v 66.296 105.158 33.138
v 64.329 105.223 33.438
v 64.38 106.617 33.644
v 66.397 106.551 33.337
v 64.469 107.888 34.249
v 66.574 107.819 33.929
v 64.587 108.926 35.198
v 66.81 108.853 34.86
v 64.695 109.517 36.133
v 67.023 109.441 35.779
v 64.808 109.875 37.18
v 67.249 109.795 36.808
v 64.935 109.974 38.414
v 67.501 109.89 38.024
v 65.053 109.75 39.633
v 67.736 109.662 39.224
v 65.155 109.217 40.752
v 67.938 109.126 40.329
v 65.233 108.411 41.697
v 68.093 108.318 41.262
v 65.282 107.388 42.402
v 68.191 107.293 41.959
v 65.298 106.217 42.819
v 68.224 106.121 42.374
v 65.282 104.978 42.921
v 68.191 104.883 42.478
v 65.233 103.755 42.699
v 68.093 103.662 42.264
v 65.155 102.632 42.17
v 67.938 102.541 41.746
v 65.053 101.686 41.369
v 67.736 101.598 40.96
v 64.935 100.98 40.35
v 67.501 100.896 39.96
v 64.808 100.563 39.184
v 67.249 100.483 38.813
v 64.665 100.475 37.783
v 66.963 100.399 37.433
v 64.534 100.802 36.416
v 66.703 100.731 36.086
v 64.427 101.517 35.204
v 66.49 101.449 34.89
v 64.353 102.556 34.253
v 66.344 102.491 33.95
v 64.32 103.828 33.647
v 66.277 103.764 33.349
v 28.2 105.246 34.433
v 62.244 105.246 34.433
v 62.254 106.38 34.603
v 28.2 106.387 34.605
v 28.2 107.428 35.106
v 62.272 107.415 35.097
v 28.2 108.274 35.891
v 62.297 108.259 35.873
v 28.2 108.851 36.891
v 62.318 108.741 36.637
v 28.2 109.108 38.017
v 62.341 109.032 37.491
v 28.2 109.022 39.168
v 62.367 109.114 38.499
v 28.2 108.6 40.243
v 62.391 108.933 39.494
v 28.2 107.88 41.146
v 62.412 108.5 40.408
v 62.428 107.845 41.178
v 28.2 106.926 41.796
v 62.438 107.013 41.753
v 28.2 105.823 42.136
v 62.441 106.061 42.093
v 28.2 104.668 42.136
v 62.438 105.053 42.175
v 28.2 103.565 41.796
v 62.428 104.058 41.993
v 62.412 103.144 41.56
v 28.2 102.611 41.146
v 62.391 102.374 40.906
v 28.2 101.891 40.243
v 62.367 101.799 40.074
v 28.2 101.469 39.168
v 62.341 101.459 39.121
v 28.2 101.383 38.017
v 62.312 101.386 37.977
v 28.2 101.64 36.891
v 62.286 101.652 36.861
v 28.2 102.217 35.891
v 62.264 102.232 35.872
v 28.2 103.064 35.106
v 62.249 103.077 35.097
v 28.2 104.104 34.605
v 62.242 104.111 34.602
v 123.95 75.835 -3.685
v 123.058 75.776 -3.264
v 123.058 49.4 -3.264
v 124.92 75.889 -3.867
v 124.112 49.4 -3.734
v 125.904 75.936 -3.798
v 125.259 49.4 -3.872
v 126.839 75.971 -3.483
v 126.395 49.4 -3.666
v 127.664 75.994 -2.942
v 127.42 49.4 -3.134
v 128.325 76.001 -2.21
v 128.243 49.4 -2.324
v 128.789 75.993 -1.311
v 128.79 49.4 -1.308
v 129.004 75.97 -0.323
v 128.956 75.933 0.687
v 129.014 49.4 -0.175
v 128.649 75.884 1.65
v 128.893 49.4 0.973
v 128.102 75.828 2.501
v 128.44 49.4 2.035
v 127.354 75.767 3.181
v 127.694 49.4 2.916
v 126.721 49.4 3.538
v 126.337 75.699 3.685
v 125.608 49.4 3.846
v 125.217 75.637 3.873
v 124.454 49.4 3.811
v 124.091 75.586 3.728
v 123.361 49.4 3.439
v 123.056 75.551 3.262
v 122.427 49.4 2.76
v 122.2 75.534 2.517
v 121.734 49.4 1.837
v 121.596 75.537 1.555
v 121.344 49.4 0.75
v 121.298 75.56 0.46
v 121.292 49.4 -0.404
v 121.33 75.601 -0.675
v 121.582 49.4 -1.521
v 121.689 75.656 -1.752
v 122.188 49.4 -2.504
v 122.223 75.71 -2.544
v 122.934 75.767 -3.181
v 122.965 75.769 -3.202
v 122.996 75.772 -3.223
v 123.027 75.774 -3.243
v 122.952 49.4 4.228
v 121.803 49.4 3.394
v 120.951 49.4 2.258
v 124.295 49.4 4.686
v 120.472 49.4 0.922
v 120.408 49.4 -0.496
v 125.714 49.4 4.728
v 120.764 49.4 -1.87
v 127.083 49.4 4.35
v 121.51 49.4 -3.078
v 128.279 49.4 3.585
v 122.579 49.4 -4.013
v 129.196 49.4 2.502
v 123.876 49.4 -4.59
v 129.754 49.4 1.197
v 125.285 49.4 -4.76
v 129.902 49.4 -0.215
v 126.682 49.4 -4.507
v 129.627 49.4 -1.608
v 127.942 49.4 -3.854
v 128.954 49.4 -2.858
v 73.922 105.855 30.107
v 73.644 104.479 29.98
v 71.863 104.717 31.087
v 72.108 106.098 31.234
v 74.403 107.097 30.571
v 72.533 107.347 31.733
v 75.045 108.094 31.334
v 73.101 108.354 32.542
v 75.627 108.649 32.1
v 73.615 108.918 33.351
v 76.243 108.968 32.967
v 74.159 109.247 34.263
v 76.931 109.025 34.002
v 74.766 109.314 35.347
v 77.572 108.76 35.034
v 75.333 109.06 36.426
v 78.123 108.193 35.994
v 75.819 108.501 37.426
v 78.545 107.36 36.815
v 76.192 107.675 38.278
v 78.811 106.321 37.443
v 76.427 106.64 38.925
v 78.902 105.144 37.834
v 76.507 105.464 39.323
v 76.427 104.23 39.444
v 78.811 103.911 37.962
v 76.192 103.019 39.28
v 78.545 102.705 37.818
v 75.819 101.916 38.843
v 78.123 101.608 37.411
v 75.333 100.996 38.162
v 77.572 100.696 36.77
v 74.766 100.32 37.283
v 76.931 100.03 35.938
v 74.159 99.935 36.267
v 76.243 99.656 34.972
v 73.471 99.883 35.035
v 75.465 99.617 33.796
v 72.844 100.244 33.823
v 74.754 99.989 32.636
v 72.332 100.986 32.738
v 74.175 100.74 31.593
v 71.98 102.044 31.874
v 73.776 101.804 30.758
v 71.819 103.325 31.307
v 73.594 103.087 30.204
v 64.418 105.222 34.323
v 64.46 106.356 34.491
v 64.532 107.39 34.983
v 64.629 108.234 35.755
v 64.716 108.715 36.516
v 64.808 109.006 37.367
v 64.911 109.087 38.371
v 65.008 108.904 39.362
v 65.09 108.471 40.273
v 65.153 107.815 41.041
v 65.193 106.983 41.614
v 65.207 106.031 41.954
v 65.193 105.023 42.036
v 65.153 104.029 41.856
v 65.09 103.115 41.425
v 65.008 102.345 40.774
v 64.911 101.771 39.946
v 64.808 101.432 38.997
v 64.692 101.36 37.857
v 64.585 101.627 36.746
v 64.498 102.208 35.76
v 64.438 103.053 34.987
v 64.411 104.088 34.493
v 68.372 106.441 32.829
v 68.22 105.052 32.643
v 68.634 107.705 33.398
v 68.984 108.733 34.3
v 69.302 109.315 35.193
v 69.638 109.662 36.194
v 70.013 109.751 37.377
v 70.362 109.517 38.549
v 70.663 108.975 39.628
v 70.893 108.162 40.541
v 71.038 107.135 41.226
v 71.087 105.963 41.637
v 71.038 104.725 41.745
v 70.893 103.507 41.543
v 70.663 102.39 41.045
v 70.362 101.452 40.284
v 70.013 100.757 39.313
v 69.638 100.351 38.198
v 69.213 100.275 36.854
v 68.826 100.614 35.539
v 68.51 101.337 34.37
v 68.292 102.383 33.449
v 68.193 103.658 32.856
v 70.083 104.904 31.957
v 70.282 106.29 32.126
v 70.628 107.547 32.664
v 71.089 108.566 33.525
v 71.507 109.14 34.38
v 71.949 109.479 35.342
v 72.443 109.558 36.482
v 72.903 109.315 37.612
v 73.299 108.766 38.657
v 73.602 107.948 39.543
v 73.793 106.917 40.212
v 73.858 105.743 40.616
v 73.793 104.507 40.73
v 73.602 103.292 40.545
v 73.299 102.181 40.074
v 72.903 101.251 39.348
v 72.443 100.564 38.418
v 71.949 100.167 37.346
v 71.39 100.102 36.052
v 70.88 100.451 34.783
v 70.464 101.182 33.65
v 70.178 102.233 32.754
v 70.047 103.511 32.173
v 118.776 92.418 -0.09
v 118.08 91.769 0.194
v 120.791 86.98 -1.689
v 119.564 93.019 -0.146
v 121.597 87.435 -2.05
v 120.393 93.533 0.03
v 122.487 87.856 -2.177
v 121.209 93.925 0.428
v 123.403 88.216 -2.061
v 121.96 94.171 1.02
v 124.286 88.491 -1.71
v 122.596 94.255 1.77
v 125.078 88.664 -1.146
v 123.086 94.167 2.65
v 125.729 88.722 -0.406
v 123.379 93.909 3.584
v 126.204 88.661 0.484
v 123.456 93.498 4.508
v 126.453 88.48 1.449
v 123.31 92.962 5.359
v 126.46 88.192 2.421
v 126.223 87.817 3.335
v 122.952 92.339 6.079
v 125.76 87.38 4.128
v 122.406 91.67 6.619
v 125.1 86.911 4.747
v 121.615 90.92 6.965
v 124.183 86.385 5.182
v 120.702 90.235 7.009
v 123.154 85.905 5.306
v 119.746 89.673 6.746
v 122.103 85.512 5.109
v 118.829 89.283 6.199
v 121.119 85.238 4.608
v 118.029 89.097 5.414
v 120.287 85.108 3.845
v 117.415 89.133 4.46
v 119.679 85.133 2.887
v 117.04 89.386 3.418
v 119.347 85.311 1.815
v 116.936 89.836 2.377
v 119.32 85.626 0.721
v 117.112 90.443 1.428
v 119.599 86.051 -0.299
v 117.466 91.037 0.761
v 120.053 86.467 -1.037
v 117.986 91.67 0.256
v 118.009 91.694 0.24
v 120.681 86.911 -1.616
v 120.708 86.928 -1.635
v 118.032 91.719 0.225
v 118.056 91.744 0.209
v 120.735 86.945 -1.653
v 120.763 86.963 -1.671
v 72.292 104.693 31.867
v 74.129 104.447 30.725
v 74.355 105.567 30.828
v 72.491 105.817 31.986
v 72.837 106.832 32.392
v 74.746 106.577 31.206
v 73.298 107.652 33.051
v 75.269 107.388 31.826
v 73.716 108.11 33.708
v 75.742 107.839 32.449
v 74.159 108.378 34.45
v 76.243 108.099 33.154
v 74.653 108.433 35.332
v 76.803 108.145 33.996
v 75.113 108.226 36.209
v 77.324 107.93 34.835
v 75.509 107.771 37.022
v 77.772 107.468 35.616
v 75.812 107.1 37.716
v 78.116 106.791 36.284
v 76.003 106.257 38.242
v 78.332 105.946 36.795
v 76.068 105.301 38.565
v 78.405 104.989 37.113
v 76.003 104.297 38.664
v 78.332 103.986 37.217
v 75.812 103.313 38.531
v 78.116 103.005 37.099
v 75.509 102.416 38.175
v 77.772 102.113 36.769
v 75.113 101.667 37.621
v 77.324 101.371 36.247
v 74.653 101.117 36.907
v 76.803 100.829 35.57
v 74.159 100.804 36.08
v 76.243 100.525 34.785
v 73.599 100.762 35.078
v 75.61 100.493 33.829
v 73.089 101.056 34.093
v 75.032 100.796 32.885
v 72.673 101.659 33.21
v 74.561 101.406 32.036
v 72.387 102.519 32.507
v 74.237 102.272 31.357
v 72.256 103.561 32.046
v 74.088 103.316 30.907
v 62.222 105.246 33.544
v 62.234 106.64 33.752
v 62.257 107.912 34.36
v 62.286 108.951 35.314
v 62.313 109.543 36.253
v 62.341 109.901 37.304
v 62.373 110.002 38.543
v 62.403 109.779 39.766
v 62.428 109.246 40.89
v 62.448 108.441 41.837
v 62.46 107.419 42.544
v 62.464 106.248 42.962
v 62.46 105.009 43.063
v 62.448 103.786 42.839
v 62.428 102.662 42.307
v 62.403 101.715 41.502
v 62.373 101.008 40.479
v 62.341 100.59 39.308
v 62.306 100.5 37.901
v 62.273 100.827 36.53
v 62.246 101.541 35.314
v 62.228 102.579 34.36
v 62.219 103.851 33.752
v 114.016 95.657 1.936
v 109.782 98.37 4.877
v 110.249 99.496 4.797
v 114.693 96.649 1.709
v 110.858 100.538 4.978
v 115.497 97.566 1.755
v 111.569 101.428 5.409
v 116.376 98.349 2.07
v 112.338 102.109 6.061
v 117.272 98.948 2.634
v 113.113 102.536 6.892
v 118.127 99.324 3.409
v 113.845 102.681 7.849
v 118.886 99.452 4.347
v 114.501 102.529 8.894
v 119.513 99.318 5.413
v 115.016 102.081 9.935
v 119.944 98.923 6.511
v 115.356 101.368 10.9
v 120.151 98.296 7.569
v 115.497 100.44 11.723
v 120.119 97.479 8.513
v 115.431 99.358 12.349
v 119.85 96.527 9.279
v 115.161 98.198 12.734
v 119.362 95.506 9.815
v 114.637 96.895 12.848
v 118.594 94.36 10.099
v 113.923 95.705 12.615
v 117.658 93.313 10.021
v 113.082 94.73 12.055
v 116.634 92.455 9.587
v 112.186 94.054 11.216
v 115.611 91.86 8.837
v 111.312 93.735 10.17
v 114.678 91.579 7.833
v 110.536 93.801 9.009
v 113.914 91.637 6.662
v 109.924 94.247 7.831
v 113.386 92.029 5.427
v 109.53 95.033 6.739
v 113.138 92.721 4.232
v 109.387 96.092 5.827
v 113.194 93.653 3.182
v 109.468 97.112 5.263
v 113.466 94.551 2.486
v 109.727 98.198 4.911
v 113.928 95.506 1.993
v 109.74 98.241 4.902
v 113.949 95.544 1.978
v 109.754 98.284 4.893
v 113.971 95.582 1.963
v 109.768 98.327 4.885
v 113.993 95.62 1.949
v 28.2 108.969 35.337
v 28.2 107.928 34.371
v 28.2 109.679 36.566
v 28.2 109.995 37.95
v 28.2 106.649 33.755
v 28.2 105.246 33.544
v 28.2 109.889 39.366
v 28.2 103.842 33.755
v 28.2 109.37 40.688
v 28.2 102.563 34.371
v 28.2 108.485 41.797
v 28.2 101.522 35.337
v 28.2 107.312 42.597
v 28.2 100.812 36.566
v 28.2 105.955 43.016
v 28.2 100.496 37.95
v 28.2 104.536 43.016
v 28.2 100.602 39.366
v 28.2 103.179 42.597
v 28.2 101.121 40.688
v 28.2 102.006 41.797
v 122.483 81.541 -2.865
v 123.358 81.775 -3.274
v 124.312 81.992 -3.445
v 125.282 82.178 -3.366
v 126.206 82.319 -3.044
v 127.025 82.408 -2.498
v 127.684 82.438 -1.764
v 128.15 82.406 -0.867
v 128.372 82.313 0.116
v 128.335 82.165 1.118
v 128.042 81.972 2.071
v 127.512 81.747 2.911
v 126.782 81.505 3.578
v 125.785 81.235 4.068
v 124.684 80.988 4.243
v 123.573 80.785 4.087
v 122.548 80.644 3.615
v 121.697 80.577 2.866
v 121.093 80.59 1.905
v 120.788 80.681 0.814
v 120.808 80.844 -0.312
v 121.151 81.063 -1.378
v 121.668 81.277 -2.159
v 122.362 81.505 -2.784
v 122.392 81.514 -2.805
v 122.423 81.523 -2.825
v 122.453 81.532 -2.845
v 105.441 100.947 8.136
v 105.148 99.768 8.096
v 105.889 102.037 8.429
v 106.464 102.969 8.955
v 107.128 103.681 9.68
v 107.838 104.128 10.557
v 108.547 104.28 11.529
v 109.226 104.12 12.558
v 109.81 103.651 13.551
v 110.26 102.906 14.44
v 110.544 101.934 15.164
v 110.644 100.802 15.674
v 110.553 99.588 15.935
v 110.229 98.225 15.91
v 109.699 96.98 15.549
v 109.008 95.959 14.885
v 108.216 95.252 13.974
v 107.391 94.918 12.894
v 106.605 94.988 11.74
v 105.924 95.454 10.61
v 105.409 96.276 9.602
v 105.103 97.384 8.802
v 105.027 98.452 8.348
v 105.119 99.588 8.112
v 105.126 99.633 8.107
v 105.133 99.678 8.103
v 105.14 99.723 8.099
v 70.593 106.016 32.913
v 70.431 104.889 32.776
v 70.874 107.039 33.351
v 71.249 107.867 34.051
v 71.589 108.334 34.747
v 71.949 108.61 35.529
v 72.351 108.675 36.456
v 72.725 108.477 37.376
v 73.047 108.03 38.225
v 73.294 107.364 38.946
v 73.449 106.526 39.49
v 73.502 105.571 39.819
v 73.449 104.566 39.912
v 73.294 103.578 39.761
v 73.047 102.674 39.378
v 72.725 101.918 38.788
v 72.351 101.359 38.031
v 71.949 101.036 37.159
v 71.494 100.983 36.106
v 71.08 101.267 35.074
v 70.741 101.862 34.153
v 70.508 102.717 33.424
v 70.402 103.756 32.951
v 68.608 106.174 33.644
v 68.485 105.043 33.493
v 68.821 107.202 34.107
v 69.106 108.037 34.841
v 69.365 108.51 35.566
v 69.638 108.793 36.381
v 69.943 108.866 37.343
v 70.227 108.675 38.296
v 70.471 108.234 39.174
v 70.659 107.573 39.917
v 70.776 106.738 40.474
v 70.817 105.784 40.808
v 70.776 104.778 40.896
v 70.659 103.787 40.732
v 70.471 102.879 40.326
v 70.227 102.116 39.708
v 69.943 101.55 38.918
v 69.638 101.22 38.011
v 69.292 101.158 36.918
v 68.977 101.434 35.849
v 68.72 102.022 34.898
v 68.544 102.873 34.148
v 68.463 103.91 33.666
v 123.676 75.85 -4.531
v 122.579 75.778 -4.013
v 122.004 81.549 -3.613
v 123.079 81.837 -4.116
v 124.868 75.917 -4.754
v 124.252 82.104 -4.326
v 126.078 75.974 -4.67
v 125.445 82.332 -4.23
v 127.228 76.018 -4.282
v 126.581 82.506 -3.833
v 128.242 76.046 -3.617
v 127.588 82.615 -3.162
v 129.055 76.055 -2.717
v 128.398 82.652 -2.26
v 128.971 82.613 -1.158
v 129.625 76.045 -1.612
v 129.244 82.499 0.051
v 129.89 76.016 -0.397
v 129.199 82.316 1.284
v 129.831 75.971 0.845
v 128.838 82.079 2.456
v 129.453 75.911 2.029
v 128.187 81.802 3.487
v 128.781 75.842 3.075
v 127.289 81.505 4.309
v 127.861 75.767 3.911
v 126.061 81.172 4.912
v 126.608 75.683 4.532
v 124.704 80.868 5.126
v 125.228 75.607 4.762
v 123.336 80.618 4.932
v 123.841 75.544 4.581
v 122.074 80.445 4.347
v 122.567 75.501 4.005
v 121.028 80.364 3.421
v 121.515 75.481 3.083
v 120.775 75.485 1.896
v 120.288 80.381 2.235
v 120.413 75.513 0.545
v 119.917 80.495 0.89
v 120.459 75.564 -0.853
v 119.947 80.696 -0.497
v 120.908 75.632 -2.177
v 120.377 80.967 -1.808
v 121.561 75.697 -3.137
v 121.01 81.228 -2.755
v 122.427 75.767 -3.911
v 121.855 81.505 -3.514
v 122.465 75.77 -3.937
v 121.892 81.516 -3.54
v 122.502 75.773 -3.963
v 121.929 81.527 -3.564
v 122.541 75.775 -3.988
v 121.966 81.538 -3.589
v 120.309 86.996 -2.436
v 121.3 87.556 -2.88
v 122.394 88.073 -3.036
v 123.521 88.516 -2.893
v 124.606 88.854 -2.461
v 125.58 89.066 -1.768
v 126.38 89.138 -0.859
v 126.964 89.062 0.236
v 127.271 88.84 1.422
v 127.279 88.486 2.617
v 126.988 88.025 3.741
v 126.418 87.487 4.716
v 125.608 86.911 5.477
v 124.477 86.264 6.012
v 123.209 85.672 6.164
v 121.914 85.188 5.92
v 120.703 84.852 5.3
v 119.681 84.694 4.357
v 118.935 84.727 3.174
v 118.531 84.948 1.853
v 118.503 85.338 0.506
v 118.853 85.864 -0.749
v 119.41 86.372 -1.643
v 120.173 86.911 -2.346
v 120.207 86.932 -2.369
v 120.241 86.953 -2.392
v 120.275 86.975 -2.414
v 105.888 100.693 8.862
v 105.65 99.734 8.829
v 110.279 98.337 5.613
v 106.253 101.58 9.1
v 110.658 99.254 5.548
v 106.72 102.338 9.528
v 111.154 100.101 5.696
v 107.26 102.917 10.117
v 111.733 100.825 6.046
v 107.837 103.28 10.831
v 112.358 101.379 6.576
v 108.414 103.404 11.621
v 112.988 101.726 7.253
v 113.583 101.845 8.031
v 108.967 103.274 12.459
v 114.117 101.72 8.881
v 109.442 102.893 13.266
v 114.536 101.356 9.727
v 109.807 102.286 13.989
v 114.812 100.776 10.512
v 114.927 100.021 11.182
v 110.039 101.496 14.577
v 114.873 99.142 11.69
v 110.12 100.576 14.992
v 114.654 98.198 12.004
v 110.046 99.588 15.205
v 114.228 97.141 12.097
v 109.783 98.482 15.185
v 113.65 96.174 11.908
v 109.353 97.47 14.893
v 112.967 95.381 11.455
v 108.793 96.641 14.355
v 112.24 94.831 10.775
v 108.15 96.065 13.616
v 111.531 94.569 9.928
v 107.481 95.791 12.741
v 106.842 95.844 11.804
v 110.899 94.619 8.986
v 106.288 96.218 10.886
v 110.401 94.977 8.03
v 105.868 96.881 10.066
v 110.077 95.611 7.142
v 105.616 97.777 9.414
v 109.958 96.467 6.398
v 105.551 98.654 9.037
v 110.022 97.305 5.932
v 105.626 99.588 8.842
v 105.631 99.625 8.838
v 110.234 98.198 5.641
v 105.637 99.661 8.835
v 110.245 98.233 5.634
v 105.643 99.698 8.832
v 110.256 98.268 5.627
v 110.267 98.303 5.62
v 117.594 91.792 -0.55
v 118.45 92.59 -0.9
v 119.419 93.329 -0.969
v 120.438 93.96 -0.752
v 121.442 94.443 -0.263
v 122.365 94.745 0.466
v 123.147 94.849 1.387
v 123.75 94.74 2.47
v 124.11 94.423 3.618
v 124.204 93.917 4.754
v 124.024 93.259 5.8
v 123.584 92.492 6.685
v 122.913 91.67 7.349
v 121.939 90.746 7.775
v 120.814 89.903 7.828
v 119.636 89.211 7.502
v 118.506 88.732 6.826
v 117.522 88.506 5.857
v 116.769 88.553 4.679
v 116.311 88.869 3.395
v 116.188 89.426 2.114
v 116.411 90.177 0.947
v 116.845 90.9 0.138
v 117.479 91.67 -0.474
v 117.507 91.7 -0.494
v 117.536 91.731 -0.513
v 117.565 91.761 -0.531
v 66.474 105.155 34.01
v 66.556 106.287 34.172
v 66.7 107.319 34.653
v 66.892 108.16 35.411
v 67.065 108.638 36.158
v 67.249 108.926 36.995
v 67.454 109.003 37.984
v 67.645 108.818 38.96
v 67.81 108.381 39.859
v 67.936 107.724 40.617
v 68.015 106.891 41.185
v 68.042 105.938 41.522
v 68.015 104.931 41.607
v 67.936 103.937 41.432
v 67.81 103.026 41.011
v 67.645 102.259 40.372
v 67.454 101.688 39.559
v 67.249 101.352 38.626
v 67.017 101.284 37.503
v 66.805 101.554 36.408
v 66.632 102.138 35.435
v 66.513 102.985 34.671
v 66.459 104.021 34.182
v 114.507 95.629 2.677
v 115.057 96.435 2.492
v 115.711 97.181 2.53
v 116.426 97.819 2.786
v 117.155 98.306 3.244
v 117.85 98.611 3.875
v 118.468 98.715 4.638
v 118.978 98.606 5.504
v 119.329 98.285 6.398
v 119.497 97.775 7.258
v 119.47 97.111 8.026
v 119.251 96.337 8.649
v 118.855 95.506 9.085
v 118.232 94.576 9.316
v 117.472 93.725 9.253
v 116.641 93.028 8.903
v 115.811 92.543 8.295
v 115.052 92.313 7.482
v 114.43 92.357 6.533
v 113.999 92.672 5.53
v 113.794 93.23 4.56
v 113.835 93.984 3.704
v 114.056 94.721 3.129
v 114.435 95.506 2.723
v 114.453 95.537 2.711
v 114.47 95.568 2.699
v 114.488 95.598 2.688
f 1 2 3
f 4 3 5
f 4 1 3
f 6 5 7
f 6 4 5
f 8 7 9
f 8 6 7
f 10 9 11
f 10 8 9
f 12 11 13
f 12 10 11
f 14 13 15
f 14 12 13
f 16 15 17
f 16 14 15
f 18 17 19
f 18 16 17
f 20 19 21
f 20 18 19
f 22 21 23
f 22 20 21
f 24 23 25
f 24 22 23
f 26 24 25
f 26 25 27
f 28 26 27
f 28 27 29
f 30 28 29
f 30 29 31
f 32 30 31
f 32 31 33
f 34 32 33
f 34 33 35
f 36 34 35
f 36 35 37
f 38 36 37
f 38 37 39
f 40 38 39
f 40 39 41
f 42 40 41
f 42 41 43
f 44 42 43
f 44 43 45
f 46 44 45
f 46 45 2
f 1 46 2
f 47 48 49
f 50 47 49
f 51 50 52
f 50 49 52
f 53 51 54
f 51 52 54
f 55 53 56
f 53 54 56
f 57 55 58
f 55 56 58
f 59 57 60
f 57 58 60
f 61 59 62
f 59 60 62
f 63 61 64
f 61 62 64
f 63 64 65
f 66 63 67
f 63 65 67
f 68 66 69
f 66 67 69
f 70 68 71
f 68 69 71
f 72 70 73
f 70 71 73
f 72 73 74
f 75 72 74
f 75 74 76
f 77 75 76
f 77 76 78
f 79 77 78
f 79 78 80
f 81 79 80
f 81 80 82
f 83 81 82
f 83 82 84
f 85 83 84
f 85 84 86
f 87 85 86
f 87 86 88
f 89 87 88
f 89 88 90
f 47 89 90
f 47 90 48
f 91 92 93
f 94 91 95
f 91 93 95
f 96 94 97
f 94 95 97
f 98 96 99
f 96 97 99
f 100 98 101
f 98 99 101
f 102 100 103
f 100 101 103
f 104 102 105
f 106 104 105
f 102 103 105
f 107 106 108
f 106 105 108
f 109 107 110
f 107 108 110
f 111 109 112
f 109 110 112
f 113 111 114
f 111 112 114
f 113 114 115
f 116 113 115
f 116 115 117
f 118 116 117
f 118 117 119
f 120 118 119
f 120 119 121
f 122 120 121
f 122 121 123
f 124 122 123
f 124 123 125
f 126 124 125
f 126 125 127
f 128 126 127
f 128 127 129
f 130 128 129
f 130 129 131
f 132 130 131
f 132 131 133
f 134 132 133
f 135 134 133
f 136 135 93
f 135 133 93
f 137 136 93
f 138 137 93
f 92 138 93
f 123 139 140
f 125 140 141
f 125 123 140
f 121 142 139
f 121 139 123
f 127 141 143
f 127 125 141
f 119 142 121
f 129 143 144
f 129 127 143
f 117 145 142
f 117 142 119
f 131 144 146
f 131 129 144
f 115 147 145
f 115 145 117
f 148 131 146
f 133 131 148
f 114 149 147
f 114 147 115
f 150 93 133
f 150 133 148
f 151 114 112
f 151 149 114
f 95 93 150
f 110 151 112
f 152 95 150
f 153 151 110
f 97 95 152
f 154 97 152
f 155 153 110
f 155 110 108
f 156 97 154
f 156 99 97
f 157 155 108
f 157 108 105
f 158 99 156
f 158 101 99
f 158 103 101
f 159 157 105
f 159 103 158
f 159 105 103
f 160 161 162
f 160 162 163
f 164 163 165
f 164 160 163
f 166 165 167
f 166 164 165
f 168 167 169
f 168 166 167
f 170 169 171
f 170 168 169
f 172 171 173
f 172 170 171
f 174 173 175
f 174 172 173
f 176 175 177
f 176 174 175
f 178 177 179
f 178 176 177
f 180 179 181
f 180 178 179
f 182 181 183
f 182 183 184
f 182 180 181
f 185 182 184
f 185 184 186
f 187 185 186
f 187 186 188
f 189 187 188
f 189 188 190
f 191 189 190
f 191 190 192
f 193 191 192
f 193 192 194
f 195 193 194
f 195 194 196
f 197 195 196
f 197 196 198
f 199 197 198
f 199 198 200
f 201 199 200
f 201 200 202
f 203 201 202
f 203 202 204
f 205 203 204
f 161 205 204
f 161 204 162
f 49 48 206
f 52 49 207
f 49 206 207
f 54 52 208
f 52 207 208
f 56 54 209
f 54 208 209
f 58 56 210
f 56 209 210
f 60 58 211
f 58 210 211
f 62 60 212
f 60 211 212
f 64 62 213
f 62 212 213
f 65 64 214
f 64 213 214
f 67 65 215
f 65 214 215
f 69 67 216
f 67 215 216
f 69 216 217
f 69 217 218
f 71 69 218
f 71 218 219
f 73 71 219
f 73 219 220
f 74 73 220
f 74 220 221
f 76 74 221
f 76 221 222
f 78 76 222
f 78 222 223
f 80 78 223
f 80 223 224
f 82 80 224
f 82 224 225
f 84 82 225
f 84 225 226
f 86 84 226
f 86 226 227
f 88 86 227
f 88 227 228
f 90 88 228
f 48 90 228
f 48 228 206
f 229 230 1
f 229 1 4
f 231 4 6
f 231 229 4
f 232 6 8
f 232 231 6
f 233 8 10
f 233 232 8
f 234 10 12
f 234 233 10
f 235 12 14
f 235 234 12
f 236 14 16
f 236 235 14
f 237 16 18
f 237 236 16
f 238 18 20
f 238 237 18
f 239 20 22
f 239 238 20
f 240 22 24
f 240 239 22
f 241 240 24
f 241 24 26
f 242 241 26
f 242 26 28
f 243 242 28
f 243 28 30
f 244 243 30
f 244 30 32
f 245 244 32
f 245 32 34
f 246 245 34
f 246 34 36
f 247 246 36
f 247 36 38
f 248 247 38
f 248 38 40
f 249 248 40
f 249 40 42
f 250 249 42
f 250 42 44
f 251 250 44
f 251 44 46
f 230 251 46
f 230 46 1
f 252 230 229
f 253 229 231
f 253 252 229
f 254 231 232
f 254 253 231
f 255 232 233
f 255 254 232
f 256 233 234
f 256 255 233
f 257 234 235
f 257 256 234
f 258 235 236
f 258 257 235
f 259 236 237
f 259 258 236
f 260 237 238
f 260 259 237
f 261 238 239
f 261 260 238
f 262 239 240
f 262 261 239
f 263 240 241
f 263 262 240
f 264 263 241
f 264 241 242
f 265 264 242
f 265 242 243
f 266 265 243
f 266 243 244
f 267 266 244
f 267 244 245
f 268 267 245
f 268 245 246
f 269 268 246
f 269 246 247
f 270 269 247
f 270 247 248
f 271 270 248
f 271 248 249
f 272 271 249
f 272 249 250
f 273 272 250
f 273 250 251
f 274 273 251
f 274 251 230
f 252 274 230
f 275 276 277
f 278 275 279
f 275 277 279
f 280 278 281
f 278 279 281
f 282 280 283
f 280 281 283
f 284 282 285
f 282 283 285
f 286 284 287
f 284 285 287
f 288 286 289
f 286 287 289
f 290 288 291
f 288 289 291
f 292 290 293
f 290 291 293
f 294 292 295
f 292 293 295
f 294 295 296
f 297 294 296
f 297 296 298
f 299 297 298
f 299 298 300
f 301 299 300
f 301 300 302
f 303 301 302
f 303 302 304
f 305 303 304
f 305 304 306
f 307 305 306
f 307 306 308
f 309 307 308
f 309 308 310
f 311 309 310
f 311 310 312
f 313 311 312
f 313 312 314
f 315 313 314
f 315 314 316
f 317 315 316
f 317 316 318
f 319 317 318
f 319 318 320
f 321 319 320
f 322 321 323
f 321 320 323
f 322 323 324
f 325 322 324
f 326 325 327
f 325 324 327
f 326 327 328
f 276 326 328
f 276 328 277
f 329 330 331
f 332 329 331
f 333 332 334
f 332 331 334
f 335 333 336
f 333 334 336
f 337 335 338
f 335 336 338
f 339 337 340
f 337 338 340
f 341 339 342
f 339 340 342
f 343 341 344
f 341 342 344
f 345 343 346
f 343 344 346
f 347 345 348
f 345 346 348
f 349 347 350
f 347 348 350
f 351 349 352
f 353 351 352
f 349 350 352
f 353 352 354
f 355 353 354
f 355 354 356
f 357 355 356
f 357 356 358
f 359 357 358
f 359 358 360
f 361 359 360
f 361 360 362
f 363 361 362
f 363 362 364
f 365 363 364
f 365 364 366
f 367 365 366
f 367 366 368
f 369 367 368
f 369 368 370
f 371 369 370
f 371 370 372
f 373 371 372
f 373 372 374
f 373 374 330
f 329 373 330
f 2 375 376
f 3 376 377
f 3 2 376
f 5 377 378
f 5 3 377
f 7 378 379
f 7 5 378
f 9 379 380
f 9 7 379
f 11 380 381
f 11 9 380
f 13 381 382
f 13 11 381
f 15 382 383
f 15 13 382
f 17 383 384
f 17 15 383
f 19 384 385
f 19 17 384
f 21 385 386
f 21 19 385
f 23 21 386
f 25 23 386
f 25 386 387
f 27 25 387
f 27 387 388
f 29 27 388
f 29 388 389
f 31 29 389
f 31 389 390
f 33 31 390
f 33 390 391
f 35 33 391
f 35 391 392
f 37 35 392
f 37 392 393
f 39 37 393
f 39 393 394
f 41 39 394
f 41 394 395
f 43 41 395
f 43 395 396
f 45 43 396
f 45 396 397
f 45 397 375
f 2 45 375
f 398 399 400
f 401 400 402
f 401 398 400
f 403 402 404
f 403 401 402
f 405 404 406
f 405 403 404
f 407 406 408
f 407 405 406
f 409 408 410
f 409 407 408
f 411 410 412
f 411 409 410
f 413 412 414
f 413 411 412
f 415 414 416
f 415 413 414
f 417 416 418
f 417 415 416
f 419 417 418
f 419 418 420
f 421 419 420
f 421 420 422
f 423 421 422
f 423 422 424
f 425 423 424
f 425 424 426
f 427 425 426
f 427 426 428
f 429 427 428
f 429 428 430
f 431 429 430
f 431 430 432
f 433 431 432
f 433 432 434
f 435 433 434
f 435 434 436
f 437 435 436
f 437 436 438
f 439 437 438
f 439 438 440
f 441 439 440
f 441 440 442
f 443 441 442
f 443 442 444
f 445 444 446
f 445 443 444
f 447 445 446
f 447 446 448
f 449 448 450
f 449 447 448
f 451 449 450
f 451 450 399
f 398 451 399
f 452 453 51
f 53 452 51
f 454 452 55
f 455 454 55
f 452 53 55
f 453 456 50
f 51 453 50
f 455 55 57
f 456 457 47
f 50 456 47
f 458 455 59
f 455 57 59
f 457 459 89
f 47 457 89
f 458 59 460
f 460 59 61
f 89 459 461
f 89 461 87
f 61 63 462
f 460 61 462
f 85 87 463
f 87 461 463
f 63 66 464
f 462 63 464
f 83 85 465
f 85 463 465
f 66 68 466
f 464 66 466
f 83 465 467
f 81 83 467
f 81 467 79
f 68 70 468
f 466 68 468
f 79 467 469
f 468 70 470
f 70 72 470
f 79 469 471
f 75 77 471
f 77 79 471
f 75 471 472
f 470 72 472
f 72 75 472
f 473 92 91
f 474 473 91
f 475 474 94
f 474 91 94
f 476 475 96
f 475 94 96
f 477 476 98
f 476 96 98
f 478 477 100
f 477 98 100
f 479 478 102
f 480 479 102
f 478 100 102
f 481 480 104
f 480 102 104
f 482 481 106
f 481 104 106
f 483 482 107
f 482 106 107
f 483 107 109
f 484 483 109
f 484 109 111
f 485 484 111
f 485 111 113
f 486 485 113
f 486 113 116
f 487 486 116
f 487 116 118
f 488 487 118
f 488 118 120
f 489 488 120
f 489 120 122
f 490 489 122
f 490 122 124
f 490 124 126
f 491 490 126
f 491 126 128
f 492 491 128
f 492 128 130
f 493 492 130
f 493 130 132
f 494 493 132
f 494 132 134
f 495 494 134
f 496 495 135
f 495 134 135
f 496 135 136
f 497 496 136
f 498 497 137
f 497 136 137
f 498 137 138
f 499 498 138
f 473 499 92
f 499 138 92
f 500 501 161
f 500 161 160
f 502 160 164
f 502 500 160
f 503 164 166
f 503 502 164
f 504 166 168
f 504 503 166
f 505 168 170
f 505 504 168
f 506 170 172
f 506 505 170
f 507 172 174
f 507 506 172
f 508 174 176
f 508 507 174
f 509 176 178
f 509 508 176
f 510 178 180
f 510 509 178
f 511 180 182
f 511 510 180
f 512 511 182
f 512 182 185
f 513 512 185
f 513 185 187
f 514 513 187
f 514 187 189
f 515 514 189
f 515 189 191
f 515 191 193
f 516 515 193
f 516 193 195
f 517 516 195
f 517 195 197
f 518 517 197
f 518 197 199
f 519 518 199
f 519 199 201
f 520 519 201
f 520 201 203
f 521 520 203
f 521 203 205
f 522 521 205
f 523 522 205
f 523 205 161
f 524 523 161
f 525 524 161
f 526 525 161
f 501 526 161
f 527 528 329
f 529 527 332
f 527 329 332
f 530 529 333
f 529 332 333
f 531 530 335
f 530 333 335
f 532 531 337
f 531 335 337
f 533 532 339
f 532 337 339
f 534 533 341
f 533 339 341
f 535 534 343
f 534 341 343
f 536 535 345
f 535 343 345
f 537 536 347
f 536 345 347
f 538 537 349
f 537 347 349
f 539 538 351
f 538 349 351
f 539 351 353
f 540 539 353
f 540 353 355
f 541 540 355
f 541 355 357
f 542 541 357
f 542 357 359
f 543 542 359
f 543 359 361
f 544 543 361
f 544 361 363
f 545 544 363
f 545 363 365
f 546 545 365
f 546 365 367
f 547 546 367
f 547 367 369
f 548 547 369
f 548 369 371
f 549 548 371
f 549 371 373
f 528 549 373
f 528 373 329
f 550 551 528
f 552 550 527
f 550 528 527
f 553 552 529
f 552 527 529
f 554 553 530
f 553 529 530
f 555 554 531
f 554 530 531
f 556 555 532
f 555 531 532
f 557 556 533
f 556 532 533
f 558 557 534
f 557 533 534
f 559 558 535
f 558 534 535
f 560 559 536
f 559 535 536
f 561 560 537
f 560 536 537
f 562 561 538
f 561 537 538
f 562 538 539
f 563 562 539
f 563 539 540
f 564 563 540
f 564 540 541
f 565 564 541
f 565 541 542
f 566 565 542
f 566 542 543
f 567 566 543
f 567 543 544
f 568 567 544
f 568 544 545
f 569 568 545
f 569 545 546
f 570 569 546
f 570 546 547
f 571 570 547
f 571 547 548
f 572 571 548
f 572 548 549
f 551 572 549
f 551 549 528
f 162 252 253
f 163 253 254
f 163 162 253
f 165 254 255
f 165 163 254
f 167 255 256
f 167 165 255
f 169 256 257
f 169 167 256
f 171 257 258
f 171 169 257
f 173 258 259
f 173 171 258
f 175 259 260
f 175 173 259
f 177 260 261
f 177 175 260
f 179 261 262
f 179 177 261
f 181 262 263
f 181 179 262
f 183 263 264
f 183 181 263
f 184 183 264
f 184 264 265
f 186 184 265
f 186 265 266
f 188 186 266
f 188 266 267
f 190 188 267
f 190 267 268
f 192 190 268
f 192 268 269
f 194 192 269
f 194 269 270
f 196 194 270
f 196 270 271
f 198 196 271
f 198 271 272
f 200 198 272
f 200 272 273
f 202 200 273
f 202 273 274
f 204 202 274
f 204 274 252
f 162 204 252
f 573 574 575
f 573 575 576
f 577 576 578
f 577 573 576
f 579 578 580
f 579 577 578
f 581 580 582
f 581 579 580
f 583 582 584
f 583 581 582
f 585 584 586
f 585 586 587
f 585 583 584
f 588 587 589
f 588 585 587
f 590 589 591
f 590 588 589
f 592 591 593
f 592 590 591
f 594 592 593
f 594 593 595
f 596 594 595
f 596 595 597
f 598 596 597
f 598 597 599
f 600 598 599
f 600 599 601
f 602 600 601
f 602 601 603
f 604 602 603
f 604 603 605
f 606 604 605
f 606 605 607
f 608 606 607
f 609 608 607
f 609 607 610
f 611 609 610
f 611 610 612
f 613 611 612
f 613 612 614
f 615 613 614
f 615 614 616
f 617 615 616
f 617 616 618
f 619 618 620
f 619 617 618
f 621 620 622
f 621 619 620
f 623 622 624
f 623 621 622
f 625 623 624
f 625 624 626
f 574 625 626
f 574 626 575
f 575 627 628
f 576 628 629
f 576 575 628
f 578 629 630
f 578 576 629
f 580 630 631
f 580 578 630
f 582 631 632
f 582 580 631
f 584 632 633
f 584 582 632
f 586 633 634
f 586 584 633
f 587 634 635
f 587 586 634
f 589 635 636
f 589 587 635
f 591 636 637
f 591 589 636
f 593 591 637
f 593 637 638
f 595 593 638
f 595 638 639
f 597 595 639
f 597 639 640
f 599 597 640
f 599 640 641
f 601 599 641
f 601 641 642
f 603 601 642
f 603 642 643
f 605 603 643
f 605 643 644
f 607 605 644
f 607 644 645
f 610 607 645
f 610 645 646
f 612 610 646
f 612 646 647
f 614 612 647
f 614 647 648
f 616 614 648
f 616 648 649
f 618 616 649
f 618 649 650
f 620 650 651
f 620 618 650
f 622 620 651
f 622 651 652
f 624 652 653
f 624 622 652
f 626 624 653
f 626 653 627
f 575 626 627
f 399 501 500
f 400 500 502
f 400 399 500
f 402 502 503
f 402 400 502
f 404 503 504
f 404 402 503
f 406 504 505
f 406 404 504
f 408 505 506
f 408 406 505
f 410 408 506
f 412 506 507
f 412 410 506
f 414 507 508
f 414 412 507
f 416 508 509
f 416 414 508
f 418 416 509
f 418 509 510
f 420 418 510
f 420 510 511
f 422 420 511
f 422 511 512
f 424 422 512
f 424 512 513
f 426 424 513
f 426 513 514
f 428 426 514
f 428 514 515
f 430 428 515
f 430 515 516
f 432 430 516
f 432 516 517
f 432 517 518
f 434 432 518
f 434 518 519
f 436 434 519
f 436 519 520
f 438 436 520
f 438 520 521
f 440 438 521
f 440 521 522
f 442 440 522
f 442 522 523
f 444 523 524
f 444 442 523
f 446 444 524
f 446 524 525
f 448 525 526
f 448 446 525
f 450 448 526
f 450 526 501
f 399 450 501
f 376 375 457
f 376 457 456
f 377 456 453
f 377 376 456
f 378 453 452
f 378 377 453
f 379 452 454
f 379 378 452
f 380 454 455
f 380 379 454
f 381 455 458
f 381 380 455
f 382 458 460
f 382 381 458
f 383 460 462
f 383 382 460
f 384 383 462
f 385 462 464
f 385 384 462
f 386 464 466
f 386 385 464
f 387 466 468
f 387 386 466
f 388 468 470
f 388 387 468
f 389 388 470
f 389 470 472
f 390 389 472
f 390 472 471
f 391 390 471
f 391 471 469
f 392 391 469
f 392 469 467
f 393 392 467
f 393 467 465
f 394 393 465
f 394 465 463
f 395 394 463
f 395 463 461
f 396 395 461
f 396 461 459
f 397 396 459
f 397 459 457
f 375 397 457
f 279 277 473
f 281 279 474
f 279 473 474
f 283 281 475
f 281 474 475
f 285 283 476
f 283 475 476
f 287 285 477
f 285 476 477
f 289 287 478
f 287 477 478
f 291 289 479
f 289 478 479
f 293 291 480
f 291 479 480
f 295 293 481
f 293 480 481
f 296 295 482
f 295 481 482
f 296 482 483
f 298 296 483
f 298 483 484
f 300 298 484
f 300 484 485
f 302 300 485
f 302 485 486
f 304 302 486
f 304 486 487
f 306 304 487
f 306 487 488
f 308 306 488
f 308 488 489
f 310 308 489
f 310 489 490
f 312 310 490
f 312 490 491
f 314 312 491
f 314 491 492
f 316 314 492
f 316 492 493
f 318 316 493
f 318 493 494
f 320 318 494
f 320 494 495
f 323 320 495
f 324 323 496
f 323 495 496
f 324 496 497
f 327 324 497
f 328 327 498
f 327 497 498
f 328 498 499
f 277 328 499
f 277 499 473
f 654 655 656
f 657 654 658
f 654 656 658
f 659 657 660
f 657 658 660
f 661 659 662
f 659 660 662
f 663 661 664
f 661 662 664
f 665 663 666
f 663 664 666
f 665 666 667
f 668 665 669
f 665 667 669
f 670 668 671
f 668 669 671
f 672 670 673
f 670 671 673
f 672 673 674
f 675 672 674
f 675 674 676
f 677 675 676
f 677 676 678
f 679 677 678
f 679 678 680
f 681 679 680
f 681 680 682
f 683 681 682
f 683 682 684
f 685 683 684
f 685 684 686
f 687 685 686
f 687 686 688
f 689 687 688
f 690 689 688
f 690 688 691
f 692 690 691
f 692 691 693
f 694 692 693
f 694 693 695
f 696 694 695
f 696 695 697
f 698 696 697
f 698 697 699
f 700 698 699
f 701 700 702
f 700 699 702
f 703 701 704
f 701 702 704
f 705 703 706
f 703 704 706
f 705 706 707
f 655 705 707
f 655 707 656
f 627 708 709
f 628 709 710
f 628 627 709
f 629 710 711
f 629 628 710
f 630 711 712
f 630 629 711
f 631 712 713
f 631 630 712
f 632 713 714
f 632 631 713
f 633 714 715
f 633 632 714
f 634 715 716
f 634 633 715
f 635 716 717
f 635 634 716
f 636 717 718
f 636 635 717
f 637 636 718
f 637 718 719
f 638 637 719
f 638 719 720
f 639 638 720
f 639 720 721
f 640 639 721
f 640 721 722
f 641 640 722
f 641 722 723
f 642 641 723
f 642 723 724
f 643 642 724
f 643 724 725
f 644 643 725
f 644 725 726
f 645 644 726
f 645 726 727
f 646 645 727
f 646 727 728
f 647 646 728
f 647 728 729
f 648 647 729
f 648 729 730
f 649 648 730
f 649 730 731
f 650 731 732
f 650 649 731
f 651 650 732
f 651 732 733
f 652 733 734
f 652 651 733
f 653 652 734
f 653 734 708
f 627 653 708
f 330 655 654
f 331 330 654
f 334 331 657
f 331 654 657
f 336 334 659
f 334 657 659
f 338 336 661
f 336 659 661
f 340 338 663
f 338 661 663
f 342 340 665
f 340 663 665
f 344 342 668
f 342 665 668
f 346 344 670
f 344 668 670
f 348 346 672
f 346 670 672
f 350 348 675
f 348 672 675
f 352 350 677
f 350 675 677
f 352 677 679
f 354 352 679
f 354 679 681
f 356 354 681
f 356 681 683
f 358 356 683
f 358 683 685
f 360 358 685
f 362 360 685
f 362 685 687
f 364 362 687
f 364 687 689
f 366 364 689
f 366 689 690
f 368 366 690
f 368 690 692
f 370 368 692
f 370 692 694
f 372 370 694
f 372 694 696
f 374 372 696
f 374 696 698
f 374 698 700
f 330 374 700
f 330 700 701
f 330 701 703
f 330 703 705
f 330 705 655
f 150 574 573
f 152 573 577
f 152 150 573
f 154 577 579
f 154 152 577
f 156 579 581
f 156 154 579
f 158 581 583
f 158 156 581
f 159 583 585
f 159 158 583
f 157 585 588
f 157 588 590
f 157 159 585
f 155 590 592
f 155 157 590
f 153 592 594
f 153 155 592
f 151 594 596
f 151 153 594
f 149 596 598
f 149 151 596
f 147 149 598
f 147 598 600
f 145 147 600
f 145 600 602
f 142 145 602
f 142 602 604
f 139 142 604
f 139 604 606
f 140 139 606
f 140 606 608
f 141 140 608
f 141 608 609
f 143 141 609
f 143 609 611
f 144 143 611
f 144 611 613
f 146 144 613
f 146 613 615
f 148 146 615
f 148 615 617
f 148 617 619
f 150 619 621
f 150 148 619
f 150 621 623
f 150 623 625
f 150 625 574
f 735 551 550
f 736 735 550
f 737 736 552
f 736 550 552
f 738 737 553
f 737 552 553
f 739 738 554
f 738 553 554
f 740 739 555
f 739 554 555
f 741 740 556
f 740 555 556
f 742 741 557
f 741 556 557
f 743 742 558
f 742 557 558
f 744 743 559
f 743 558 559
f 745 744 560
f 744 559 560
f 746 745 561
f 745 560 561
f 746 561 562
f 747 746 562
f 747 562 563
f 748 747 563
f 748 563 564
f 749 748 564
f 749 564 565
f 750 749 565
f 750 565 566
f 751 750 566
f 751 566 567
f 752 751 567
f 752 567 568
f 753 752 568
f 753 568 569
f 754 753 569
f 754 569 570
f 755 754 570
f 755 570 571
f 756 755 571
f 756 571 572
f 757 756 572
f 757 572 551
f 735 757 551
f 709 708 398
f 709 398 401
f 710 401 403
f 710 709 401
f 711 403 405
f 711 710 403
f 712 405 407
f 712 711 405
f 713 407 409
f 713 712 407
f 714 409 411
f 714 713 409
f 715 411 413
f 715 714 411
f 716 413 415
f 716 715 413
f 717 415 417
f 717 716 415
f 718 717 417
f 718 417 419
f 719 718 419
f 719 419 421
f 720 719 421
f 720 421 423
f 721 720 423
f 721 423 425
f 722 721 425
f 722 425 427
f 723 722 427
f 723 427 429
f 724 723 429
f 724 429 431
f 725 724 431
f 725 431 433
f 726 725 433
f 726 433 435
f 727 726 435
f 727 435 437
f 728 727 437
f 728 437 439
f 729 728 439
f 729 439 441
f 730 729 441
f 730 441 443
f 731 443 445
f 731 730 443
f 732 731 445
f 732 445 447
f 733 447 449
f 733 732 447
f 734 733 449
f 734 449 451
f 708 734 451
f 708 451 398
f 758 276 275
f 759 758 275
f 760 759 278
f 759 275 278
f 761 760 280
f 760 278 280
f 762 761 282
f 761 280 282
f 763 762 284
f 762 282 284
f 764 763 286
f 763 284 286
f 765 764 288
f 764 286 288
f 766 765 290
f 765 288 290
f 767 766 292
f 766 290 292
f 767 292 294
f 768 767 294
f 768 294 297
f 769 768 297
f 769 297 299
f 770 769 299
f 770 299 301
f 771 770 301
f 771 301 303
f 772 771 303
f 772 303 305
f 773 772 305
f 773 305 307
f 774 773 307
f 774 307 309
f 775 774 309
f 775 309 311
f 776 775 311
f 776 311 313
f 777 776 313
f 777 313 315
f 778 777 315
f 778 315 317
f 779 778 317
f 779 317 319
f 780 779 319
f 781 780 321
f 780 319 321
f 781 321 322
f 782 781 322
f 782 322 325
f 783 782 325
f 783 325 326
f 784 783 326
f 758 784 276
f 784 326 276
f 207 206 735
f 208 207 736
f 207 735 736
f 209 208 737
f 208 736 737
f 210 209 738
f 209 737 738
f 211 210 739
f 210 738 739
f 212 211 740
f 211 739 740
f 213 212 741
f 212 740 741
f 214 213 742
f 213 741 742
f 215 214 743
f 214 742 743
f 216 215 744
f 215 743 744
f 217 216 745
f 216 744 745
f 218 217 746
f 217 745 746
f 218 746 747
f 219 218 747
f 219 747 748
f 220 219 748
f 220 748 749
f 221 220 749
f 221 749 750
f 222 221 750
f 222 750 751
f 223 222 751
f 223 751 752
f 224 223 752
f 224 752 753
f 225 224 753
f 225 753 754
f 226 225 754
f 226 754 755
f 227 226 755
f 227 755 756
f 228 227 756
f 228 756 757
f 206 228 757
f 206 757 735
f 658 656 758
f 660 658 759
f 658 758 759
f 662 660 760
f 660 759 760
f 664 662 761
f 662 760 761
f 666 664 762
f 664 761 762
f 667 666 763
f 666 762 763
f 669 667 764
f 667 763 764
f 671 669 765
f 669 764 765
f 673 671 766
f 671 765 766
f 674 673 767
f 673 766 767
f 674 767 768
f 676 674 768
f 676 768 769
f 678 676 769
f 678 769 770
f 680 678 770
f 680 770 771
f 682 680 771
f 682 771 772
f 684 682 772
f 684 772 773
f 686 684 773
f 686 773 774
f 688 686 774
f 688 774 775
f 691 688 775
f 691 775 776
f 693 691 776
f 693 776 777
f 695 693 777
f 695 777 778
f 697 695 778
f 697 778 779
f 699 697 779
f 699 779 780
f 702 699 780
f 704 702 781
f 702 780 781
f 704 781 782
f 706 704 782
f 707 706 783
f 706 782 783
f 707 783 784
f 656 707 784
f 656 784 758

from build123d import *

# Parameters (mm, degrees)
PROFILE_R   = 4.7625
PROFILE_R_2 = 3.8735


with BuildPart() as part:
    # Tube: sweep along a curve in space
    with BuildLine() as tube_path:
        Line((28.2, 105.245573528, 38.306256052), (62.341451663, 105.245573528, 38.306256052))
        Line((62.341451663, 105.245573528, 38.306256052), (64.808223176, 105.218825972, 38.181995595))
        Line((64.808223176, 105.218825972, 38.181995595), (67.248866106, 105.138866619, 37.810530418))
        Line((67.248866106, 105.138866619, 37.810530418), (69.63752863, 105.006542417, 37.195795159))
        Line((69.63752863, 105.006542417, 37.195795159), (71.948909514, 104.823254972, 36.344301231))
        Line((71.948909514, 104.823254972, 36.344301231), (74.158526106, 104.590945705, 35.265067843))
        Line((74.158526106, 104.590945705, 35.265067843), (76.242973665, 104.312075287, 33.969526469))
        Line((76.242973665, 104.312075287, 33.969526469), (107.835723721, 99.58808025, 12.023380107))
        Line((107.835723721, 99.58808025, 12.023380107), (112.443681745, 98.197740878, 8.82242669))
        Line((112.443681745, 98.197740878, 8.82242669), (116.644976055, 95.506248168, 5.903965345))
        Line((116.644976055, 95.506248168, 5.903965345), (120.195899313, 91.669729365, 3.437289243))
        Line((120.195899313, 91.669729365, 3.437289243), (122.890470703, 86.910732024, 1.565484541))
        Line((122.890470703, 86.910732024, 1.565484541), (124.572384389, 81.505314539, 0.397130287))
        Line((124.572384389, 81.505314539, 0.397130287), (125.144076461, 75.767032634, 0))
        Line((125.144076461, 75.767032634, 0), (125.144076461, 49.4, 0))
    # Profile → Tube (sweep)
    with BuildSketch(Plane(origin=(28.2, 0, 0), x_dir=(0, 0, -1), z_dir=(1, 0, 0))):
        with Locations((-38.306256052, 105.245573528)):
            Circle(PROFILE_R)
        with Locations((-38.306256052, 105.245573528)):
            Circle(PROFILE_R_2, mode=Mode.SUBTRACT)
    sweep(path=tube_path.line, transition=Transition.RIGHT)


solid = part.part
